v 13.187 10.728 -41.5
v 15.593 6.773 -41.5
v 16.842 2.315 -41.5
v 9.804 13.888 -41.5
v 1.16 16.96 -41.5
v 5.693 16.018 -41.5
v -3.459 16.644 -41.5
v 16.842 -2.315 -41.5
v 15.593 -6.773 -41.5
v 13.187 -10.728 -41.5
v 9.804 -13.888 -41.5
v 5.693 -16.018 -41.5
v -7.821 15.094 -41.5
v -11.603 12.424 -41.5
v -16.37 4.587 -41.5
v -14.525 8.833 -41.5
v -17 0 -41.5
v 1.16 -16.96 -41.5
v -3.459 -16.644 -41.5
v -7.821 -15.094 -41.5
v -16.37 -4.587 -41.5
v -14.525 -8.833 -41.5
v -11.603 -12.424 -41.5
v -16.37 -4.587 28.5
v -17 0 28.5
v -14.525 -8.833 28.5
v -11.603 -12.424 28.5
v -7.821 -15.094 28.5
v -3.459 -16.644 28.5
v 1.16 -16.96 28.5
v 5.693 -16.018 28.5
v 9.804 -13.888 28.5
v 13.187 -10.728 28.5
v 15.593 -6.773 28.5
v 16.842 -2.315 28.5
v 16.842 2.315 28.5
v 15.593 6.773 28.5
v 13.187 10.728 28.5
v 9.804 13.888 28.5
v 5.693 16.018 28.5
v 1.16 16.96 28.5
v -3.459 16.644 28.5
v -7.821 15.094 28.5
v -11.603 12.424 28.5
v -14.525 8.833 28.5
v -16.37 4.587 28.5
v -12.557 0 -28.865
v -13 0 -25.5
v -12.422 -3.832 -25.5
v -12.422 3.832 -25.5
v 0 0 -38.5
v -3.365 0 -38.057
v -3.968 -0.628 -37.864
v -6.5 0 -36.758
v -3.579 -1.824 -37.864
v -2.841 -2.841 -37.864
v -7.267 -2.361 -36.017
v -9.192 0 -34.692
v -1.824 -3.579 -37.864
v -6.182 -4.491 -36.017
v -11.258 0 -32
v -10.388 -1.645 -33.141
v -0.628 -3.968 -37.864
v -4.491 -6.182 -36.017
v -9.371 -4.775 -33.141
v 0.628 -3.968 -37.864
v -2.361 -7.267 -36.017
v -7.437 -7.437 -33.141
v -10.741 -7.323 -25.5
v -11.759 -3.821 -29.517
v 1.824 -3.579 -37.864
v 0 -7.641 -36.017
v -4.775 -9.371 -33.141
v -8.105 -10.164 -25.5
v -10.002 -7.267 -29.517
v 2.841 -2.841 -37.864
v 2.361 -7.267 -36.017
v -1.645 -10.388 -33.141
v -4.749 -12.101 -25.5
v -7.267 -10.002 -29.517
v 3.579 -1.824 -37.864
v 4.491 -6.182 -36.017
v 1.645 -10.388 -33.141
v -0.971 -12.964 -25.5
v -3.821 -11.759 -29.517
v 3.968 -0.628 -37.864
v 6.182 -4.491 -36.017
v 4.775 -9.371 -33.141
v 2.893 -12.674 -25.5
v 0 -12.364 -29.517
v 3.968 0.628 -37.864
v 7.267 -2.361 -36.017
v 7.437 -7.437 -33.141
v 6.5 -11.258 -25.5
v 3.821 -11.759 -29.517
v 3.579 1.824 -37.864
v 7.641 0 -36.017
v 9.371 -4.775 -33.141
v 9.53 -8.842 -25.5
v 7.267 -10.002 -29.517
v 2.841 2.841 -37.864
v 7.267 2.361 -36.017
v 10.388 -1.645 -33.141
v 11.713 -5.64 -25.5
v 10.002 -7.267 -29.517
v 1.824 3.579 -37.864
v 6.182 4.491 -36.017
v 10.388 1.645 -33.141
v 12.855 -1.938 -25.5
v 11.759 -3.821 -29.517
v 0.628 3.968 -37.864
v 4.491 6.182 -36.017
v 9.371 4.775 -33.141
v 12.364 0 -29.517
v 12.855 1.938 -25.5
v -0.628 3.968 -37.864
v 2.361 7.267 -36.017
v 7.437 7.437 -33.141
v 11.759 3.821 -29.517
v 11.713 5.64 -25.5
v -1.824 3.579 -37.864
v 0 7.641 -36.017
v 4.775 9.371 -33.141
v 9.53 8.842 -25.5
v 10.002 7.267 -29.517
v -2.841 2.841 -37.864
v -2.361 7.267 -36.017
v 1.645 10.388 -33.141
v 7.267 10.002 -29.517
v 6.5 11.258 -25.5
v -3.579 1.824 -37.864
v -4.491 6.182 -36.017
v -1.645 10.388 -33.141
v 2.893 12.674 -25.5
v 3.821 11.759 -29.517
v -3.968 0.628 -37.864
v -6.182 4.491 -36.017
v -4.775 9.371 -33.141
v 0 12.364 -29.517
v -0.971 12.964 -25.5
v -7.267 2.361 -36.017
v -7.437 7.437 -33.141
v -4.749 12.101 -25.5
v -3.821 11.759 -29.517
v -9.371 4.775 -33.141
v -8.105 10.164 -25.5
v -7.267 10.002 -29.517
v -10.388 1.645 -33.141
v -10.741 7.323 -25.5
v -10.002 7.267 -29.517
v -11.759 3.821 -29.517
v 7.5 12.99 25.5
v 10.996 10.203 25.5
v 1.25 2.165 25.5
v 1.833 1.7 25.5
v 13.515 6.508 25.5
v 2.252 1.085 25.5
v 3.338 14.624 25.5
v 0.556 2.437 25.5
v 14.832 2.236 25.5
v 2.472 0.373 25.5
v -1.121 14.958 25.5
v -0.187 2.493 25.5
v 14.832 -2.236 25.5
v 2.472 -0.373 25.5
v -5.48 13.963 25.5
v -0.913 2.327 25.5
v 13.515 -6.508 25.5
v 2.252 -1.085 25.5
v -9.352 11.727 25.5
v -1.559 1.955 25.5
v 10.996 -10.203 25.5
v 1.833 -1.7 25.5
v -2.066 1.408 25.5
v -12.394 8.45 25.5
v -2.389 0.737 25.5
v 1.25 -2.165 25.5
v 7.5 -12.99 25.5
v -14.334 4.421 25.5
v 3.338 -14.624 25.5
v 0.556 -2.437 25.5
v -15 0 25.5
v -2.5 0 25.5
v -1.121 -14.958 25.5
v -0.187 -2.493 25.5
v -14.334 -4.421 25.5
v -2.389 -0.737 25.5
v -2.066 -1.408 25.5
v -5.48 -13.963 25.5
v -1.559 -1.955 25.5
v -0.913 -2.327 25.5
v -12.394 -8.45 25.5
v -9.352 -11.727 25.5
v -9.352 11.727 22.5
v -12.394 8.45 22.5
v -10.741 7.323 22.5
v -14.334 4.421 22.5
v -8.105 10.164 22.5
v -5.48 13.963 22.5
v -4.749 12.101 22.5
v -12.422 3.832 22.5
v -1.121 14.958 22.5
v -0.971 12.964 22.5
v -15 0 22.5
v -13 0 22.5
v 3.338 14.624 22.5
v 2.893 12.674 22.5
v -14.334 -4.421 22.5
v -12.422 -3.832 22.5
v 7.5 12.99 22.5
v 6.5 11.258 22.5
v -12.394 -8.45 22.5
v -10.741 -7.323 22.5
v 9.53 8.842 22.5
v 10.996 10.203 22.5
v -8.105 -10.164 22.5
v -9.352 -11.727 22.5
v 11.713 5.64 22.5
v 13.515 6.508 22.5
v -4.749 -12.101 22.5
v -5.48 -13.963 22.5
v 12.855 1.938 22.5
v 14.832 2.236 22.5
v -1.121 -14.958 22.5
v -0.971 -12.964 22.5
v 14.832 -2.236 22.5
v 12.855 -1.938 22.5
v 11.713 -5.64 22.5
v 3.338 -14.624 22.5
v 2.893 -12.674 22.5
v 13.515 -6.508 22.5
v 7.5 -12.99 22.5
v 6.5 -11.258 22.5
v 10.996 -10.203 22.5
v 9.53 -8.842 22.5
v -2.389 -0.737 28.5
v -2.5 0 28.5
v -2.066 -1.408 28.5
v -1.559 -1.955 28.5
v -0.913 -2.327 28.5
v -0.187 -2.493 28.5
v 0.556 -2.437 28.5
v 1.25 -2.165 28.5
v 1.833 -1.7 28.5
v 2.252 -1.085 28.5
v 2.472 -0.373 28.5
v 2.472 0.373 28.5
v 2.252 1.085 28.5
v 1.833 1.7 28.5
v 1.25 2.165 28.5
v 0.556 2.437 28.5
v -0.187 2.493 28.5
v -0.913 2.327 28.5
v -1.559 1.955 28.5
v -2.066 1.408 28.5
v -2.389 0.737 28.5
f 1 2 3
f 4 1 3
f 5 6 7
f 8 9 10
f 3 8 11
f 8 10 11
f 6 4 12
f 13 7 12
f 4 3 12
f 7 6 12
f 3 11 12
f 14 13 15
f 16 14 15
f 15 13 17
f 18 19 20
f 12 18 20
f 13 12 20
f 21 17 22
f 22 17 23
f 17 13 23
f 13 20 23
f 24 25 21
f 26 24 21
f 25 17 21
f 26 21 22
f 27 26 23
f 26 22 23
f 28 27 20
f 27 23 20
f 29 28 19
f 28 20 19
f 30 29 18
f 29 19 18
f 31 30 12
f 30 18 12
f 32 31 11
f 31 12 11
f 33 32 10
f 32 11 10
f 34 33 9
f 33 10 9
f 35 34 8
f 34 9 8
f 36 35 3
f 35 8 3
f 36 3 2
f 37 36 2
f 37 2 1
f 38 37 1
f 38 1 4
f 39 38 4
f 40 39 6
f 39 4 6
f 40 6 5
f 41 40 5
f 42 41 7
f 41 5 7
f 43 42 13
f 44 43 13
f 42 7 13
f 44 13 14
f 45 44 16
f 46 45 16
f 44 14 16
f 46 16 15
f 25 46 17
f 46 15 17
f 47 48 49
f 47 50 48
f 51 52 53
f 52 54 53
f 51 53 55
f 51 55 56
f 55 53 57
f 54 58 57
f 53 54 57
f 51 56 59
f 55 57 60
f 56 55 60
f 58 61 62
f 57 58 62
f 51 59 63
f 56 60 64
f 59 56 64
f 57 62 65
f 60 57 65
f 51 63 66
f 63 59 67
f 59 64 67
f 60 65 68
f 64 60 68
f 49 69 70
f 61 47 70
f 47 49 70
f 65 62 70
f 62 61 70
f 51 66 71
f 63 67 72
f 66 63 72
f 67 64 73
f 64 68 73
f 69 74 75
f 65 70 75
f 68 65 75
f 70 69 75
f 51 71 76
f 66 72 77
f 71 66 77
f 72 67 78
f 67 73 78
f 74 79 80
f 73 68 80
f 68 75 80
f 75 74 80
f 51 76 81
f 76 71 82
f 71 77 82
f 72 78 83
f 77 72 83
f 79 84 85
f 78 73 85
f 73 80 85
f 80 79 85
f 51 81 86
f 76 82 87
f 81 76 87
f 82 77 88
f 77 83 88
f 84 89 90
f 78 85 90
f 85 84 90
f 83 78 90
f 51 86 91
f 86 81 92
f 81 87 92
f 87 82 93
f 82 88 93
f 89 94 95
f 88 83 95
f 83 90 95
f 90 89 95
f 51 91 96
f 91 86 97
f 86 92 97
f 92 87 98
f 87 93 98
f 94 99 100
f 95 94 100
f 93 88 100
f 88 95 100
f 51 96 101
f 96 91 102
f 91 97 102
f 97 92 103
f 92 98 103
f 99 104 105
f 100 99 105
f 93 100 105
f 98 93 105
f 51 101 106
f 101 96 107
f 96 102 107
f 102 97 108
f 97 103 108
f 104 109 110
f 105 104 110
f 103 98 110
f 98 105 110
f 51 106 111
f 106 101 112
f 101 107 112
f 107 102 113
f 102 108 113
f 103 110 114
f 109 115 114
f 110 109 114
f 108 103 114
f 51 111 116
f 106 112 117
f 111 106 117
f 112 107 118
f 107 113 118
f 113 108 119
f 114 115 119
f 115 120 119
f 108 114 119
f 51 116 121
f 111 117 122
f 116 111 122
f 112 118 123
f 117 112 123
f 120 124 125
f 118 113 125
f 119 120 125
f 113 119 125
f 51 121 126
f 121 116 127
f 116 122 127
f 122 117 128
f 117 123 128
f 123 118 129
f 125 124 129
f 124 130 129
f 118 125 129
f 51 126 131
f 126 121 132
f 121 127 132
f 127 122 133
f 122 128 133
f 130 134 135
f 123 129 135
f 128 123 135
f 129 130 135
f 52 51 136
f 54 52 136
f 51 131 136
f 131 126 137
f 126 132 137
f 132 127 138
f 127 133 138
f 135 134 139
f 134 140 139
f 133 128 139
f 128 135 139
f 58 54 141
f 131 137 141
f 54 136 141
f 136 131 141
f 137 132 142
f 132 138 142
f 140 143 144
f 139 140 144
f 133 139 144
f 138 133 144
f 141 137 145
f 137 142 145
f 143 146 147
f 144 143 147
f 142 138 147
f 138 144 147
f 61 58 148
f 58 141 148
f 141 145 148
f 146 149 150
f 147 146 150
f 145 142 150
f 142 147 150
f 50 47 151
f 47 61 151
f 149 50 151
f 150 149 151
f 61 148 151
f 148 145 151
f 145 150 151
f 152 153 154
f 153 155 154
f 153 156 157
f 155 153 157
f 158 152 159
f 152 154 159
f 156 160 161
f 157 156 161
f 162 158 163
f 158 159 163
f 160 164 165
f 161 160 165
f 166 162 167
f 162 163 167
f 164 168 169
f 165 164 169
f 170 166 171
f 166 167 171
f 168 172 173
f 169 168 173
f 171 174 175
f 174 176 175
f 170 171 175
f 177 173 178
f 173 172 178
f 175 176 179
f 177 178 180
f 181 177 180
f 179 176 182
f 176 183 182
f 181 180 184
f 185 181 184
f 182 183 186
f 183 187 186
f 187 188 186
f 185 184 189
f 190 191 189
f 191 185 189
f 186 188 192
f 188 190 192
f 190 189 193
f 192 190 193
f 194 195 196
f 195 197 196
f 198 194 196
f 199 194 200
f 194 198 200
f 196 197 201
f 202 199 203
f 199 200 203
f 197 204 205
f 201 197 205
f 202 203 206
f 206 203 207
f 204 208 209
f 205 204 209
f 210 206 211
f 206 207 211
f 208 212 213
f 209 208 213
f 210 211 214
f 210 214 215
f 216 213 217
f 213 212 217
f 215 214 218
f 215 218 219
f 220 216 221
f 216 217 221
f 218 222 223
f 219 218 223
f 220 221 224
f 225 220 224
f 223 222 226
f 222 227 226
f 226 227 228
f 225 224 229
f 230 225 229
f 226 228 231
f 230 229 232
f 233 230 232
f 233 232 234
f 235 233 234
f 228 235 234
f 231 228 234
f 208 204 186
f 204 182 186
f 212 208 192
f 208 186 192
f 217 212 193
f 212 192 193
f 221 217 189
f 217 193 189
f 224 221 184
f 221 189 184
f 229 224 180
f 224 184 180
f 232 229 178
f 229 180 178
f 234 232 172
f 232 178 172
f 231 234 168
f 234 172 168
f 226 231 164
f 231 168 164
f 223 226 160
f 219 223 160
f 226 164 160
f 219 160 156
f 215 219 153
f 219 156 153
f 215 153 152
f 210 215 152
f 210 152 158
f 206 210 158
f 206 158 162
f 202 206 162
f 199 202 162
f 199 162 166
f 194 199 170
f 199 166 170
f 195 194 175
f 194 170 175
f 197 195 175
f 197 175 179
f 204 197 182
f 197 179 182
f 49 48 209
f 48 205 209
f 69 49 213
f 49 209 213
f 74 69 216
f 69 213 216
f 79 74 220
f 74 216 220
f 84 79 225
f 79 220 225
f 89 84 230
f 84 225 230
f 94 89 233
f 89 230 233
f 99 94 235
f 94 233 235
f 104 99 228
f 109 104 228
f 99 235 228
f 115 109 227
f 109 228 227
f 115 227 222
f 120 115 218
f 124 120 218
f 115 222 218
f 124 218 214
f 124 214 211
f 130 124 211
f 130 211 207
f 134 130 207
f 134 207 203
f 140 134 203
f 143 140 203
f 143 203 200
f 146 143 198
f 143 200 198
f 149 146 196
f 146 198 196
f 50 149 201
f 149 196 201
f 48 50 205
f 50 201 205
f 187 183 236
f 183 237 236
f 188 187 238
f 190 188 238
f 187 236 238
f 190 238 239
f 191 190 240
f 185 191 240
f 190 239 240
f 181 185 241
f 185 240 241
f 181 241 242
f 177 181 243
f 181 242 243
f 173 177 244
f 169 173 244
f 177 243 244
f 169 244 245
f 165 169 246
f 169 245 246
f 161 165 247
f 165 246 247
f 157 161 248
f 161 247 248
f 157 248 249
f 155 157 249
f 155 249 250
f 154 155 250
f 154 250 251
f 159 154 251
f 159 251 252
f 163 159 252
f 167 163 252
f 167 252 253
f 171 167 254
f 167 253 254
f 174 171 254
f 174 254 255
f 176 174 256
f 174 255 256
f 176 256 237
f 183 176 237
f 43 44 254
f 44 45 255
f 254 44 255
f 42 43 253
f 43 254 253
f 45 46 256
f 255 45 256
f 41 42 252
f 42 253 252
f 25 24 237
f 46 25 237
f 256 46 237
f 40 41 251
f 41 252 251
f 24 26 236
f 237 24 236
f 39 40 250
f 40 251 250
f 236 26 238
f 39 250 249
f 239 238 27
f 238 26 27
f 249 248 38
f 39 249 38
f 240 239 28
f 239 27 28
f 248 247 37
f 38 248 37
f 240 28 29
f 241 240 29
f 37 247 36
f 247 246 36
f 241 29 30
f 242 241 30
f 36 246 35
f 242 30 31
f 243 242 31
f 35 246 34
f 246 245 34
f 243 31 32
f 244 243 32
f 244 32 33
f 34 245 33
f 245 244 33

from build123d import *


# Not quite as in the source:
# - a feature names something its author has since deleted; it is built from what else it names


with BuildPart() as f1:
    # F0 (on Front) → F1 (revolve)
    with BuildSketch(Plane.XZ):
        with BuildLine():
            Line((-15, 25.5), (-13, 25.5))
            Line((-13, 25.5), (-2.5, 25.5))
            Line((-2.5, 25.5), (-2.5, 28.5))
            Line((-2.5, 28.5), (-17, 28.5))
            Line((-17, 28.5), (-17, -41.5))
            Line((-17, -41.5), (0, -41.5))
            Line((0, -41.5), (0, -38.5))
            ThreePointArc((0, -38.5), (-9.1923881554, -34.6923881554), (-13, -25.5))
            Line((-13, -25.5), (-13, 22.5))
            Line((-13, 22.5), (-15, 22.5))
            Line((-15, 22.5), (-15, 25.5))
        make_face()
    revolve(axis=Axis((0, 0, -33.5), (0, 0, 1)))


solid = f1.part
